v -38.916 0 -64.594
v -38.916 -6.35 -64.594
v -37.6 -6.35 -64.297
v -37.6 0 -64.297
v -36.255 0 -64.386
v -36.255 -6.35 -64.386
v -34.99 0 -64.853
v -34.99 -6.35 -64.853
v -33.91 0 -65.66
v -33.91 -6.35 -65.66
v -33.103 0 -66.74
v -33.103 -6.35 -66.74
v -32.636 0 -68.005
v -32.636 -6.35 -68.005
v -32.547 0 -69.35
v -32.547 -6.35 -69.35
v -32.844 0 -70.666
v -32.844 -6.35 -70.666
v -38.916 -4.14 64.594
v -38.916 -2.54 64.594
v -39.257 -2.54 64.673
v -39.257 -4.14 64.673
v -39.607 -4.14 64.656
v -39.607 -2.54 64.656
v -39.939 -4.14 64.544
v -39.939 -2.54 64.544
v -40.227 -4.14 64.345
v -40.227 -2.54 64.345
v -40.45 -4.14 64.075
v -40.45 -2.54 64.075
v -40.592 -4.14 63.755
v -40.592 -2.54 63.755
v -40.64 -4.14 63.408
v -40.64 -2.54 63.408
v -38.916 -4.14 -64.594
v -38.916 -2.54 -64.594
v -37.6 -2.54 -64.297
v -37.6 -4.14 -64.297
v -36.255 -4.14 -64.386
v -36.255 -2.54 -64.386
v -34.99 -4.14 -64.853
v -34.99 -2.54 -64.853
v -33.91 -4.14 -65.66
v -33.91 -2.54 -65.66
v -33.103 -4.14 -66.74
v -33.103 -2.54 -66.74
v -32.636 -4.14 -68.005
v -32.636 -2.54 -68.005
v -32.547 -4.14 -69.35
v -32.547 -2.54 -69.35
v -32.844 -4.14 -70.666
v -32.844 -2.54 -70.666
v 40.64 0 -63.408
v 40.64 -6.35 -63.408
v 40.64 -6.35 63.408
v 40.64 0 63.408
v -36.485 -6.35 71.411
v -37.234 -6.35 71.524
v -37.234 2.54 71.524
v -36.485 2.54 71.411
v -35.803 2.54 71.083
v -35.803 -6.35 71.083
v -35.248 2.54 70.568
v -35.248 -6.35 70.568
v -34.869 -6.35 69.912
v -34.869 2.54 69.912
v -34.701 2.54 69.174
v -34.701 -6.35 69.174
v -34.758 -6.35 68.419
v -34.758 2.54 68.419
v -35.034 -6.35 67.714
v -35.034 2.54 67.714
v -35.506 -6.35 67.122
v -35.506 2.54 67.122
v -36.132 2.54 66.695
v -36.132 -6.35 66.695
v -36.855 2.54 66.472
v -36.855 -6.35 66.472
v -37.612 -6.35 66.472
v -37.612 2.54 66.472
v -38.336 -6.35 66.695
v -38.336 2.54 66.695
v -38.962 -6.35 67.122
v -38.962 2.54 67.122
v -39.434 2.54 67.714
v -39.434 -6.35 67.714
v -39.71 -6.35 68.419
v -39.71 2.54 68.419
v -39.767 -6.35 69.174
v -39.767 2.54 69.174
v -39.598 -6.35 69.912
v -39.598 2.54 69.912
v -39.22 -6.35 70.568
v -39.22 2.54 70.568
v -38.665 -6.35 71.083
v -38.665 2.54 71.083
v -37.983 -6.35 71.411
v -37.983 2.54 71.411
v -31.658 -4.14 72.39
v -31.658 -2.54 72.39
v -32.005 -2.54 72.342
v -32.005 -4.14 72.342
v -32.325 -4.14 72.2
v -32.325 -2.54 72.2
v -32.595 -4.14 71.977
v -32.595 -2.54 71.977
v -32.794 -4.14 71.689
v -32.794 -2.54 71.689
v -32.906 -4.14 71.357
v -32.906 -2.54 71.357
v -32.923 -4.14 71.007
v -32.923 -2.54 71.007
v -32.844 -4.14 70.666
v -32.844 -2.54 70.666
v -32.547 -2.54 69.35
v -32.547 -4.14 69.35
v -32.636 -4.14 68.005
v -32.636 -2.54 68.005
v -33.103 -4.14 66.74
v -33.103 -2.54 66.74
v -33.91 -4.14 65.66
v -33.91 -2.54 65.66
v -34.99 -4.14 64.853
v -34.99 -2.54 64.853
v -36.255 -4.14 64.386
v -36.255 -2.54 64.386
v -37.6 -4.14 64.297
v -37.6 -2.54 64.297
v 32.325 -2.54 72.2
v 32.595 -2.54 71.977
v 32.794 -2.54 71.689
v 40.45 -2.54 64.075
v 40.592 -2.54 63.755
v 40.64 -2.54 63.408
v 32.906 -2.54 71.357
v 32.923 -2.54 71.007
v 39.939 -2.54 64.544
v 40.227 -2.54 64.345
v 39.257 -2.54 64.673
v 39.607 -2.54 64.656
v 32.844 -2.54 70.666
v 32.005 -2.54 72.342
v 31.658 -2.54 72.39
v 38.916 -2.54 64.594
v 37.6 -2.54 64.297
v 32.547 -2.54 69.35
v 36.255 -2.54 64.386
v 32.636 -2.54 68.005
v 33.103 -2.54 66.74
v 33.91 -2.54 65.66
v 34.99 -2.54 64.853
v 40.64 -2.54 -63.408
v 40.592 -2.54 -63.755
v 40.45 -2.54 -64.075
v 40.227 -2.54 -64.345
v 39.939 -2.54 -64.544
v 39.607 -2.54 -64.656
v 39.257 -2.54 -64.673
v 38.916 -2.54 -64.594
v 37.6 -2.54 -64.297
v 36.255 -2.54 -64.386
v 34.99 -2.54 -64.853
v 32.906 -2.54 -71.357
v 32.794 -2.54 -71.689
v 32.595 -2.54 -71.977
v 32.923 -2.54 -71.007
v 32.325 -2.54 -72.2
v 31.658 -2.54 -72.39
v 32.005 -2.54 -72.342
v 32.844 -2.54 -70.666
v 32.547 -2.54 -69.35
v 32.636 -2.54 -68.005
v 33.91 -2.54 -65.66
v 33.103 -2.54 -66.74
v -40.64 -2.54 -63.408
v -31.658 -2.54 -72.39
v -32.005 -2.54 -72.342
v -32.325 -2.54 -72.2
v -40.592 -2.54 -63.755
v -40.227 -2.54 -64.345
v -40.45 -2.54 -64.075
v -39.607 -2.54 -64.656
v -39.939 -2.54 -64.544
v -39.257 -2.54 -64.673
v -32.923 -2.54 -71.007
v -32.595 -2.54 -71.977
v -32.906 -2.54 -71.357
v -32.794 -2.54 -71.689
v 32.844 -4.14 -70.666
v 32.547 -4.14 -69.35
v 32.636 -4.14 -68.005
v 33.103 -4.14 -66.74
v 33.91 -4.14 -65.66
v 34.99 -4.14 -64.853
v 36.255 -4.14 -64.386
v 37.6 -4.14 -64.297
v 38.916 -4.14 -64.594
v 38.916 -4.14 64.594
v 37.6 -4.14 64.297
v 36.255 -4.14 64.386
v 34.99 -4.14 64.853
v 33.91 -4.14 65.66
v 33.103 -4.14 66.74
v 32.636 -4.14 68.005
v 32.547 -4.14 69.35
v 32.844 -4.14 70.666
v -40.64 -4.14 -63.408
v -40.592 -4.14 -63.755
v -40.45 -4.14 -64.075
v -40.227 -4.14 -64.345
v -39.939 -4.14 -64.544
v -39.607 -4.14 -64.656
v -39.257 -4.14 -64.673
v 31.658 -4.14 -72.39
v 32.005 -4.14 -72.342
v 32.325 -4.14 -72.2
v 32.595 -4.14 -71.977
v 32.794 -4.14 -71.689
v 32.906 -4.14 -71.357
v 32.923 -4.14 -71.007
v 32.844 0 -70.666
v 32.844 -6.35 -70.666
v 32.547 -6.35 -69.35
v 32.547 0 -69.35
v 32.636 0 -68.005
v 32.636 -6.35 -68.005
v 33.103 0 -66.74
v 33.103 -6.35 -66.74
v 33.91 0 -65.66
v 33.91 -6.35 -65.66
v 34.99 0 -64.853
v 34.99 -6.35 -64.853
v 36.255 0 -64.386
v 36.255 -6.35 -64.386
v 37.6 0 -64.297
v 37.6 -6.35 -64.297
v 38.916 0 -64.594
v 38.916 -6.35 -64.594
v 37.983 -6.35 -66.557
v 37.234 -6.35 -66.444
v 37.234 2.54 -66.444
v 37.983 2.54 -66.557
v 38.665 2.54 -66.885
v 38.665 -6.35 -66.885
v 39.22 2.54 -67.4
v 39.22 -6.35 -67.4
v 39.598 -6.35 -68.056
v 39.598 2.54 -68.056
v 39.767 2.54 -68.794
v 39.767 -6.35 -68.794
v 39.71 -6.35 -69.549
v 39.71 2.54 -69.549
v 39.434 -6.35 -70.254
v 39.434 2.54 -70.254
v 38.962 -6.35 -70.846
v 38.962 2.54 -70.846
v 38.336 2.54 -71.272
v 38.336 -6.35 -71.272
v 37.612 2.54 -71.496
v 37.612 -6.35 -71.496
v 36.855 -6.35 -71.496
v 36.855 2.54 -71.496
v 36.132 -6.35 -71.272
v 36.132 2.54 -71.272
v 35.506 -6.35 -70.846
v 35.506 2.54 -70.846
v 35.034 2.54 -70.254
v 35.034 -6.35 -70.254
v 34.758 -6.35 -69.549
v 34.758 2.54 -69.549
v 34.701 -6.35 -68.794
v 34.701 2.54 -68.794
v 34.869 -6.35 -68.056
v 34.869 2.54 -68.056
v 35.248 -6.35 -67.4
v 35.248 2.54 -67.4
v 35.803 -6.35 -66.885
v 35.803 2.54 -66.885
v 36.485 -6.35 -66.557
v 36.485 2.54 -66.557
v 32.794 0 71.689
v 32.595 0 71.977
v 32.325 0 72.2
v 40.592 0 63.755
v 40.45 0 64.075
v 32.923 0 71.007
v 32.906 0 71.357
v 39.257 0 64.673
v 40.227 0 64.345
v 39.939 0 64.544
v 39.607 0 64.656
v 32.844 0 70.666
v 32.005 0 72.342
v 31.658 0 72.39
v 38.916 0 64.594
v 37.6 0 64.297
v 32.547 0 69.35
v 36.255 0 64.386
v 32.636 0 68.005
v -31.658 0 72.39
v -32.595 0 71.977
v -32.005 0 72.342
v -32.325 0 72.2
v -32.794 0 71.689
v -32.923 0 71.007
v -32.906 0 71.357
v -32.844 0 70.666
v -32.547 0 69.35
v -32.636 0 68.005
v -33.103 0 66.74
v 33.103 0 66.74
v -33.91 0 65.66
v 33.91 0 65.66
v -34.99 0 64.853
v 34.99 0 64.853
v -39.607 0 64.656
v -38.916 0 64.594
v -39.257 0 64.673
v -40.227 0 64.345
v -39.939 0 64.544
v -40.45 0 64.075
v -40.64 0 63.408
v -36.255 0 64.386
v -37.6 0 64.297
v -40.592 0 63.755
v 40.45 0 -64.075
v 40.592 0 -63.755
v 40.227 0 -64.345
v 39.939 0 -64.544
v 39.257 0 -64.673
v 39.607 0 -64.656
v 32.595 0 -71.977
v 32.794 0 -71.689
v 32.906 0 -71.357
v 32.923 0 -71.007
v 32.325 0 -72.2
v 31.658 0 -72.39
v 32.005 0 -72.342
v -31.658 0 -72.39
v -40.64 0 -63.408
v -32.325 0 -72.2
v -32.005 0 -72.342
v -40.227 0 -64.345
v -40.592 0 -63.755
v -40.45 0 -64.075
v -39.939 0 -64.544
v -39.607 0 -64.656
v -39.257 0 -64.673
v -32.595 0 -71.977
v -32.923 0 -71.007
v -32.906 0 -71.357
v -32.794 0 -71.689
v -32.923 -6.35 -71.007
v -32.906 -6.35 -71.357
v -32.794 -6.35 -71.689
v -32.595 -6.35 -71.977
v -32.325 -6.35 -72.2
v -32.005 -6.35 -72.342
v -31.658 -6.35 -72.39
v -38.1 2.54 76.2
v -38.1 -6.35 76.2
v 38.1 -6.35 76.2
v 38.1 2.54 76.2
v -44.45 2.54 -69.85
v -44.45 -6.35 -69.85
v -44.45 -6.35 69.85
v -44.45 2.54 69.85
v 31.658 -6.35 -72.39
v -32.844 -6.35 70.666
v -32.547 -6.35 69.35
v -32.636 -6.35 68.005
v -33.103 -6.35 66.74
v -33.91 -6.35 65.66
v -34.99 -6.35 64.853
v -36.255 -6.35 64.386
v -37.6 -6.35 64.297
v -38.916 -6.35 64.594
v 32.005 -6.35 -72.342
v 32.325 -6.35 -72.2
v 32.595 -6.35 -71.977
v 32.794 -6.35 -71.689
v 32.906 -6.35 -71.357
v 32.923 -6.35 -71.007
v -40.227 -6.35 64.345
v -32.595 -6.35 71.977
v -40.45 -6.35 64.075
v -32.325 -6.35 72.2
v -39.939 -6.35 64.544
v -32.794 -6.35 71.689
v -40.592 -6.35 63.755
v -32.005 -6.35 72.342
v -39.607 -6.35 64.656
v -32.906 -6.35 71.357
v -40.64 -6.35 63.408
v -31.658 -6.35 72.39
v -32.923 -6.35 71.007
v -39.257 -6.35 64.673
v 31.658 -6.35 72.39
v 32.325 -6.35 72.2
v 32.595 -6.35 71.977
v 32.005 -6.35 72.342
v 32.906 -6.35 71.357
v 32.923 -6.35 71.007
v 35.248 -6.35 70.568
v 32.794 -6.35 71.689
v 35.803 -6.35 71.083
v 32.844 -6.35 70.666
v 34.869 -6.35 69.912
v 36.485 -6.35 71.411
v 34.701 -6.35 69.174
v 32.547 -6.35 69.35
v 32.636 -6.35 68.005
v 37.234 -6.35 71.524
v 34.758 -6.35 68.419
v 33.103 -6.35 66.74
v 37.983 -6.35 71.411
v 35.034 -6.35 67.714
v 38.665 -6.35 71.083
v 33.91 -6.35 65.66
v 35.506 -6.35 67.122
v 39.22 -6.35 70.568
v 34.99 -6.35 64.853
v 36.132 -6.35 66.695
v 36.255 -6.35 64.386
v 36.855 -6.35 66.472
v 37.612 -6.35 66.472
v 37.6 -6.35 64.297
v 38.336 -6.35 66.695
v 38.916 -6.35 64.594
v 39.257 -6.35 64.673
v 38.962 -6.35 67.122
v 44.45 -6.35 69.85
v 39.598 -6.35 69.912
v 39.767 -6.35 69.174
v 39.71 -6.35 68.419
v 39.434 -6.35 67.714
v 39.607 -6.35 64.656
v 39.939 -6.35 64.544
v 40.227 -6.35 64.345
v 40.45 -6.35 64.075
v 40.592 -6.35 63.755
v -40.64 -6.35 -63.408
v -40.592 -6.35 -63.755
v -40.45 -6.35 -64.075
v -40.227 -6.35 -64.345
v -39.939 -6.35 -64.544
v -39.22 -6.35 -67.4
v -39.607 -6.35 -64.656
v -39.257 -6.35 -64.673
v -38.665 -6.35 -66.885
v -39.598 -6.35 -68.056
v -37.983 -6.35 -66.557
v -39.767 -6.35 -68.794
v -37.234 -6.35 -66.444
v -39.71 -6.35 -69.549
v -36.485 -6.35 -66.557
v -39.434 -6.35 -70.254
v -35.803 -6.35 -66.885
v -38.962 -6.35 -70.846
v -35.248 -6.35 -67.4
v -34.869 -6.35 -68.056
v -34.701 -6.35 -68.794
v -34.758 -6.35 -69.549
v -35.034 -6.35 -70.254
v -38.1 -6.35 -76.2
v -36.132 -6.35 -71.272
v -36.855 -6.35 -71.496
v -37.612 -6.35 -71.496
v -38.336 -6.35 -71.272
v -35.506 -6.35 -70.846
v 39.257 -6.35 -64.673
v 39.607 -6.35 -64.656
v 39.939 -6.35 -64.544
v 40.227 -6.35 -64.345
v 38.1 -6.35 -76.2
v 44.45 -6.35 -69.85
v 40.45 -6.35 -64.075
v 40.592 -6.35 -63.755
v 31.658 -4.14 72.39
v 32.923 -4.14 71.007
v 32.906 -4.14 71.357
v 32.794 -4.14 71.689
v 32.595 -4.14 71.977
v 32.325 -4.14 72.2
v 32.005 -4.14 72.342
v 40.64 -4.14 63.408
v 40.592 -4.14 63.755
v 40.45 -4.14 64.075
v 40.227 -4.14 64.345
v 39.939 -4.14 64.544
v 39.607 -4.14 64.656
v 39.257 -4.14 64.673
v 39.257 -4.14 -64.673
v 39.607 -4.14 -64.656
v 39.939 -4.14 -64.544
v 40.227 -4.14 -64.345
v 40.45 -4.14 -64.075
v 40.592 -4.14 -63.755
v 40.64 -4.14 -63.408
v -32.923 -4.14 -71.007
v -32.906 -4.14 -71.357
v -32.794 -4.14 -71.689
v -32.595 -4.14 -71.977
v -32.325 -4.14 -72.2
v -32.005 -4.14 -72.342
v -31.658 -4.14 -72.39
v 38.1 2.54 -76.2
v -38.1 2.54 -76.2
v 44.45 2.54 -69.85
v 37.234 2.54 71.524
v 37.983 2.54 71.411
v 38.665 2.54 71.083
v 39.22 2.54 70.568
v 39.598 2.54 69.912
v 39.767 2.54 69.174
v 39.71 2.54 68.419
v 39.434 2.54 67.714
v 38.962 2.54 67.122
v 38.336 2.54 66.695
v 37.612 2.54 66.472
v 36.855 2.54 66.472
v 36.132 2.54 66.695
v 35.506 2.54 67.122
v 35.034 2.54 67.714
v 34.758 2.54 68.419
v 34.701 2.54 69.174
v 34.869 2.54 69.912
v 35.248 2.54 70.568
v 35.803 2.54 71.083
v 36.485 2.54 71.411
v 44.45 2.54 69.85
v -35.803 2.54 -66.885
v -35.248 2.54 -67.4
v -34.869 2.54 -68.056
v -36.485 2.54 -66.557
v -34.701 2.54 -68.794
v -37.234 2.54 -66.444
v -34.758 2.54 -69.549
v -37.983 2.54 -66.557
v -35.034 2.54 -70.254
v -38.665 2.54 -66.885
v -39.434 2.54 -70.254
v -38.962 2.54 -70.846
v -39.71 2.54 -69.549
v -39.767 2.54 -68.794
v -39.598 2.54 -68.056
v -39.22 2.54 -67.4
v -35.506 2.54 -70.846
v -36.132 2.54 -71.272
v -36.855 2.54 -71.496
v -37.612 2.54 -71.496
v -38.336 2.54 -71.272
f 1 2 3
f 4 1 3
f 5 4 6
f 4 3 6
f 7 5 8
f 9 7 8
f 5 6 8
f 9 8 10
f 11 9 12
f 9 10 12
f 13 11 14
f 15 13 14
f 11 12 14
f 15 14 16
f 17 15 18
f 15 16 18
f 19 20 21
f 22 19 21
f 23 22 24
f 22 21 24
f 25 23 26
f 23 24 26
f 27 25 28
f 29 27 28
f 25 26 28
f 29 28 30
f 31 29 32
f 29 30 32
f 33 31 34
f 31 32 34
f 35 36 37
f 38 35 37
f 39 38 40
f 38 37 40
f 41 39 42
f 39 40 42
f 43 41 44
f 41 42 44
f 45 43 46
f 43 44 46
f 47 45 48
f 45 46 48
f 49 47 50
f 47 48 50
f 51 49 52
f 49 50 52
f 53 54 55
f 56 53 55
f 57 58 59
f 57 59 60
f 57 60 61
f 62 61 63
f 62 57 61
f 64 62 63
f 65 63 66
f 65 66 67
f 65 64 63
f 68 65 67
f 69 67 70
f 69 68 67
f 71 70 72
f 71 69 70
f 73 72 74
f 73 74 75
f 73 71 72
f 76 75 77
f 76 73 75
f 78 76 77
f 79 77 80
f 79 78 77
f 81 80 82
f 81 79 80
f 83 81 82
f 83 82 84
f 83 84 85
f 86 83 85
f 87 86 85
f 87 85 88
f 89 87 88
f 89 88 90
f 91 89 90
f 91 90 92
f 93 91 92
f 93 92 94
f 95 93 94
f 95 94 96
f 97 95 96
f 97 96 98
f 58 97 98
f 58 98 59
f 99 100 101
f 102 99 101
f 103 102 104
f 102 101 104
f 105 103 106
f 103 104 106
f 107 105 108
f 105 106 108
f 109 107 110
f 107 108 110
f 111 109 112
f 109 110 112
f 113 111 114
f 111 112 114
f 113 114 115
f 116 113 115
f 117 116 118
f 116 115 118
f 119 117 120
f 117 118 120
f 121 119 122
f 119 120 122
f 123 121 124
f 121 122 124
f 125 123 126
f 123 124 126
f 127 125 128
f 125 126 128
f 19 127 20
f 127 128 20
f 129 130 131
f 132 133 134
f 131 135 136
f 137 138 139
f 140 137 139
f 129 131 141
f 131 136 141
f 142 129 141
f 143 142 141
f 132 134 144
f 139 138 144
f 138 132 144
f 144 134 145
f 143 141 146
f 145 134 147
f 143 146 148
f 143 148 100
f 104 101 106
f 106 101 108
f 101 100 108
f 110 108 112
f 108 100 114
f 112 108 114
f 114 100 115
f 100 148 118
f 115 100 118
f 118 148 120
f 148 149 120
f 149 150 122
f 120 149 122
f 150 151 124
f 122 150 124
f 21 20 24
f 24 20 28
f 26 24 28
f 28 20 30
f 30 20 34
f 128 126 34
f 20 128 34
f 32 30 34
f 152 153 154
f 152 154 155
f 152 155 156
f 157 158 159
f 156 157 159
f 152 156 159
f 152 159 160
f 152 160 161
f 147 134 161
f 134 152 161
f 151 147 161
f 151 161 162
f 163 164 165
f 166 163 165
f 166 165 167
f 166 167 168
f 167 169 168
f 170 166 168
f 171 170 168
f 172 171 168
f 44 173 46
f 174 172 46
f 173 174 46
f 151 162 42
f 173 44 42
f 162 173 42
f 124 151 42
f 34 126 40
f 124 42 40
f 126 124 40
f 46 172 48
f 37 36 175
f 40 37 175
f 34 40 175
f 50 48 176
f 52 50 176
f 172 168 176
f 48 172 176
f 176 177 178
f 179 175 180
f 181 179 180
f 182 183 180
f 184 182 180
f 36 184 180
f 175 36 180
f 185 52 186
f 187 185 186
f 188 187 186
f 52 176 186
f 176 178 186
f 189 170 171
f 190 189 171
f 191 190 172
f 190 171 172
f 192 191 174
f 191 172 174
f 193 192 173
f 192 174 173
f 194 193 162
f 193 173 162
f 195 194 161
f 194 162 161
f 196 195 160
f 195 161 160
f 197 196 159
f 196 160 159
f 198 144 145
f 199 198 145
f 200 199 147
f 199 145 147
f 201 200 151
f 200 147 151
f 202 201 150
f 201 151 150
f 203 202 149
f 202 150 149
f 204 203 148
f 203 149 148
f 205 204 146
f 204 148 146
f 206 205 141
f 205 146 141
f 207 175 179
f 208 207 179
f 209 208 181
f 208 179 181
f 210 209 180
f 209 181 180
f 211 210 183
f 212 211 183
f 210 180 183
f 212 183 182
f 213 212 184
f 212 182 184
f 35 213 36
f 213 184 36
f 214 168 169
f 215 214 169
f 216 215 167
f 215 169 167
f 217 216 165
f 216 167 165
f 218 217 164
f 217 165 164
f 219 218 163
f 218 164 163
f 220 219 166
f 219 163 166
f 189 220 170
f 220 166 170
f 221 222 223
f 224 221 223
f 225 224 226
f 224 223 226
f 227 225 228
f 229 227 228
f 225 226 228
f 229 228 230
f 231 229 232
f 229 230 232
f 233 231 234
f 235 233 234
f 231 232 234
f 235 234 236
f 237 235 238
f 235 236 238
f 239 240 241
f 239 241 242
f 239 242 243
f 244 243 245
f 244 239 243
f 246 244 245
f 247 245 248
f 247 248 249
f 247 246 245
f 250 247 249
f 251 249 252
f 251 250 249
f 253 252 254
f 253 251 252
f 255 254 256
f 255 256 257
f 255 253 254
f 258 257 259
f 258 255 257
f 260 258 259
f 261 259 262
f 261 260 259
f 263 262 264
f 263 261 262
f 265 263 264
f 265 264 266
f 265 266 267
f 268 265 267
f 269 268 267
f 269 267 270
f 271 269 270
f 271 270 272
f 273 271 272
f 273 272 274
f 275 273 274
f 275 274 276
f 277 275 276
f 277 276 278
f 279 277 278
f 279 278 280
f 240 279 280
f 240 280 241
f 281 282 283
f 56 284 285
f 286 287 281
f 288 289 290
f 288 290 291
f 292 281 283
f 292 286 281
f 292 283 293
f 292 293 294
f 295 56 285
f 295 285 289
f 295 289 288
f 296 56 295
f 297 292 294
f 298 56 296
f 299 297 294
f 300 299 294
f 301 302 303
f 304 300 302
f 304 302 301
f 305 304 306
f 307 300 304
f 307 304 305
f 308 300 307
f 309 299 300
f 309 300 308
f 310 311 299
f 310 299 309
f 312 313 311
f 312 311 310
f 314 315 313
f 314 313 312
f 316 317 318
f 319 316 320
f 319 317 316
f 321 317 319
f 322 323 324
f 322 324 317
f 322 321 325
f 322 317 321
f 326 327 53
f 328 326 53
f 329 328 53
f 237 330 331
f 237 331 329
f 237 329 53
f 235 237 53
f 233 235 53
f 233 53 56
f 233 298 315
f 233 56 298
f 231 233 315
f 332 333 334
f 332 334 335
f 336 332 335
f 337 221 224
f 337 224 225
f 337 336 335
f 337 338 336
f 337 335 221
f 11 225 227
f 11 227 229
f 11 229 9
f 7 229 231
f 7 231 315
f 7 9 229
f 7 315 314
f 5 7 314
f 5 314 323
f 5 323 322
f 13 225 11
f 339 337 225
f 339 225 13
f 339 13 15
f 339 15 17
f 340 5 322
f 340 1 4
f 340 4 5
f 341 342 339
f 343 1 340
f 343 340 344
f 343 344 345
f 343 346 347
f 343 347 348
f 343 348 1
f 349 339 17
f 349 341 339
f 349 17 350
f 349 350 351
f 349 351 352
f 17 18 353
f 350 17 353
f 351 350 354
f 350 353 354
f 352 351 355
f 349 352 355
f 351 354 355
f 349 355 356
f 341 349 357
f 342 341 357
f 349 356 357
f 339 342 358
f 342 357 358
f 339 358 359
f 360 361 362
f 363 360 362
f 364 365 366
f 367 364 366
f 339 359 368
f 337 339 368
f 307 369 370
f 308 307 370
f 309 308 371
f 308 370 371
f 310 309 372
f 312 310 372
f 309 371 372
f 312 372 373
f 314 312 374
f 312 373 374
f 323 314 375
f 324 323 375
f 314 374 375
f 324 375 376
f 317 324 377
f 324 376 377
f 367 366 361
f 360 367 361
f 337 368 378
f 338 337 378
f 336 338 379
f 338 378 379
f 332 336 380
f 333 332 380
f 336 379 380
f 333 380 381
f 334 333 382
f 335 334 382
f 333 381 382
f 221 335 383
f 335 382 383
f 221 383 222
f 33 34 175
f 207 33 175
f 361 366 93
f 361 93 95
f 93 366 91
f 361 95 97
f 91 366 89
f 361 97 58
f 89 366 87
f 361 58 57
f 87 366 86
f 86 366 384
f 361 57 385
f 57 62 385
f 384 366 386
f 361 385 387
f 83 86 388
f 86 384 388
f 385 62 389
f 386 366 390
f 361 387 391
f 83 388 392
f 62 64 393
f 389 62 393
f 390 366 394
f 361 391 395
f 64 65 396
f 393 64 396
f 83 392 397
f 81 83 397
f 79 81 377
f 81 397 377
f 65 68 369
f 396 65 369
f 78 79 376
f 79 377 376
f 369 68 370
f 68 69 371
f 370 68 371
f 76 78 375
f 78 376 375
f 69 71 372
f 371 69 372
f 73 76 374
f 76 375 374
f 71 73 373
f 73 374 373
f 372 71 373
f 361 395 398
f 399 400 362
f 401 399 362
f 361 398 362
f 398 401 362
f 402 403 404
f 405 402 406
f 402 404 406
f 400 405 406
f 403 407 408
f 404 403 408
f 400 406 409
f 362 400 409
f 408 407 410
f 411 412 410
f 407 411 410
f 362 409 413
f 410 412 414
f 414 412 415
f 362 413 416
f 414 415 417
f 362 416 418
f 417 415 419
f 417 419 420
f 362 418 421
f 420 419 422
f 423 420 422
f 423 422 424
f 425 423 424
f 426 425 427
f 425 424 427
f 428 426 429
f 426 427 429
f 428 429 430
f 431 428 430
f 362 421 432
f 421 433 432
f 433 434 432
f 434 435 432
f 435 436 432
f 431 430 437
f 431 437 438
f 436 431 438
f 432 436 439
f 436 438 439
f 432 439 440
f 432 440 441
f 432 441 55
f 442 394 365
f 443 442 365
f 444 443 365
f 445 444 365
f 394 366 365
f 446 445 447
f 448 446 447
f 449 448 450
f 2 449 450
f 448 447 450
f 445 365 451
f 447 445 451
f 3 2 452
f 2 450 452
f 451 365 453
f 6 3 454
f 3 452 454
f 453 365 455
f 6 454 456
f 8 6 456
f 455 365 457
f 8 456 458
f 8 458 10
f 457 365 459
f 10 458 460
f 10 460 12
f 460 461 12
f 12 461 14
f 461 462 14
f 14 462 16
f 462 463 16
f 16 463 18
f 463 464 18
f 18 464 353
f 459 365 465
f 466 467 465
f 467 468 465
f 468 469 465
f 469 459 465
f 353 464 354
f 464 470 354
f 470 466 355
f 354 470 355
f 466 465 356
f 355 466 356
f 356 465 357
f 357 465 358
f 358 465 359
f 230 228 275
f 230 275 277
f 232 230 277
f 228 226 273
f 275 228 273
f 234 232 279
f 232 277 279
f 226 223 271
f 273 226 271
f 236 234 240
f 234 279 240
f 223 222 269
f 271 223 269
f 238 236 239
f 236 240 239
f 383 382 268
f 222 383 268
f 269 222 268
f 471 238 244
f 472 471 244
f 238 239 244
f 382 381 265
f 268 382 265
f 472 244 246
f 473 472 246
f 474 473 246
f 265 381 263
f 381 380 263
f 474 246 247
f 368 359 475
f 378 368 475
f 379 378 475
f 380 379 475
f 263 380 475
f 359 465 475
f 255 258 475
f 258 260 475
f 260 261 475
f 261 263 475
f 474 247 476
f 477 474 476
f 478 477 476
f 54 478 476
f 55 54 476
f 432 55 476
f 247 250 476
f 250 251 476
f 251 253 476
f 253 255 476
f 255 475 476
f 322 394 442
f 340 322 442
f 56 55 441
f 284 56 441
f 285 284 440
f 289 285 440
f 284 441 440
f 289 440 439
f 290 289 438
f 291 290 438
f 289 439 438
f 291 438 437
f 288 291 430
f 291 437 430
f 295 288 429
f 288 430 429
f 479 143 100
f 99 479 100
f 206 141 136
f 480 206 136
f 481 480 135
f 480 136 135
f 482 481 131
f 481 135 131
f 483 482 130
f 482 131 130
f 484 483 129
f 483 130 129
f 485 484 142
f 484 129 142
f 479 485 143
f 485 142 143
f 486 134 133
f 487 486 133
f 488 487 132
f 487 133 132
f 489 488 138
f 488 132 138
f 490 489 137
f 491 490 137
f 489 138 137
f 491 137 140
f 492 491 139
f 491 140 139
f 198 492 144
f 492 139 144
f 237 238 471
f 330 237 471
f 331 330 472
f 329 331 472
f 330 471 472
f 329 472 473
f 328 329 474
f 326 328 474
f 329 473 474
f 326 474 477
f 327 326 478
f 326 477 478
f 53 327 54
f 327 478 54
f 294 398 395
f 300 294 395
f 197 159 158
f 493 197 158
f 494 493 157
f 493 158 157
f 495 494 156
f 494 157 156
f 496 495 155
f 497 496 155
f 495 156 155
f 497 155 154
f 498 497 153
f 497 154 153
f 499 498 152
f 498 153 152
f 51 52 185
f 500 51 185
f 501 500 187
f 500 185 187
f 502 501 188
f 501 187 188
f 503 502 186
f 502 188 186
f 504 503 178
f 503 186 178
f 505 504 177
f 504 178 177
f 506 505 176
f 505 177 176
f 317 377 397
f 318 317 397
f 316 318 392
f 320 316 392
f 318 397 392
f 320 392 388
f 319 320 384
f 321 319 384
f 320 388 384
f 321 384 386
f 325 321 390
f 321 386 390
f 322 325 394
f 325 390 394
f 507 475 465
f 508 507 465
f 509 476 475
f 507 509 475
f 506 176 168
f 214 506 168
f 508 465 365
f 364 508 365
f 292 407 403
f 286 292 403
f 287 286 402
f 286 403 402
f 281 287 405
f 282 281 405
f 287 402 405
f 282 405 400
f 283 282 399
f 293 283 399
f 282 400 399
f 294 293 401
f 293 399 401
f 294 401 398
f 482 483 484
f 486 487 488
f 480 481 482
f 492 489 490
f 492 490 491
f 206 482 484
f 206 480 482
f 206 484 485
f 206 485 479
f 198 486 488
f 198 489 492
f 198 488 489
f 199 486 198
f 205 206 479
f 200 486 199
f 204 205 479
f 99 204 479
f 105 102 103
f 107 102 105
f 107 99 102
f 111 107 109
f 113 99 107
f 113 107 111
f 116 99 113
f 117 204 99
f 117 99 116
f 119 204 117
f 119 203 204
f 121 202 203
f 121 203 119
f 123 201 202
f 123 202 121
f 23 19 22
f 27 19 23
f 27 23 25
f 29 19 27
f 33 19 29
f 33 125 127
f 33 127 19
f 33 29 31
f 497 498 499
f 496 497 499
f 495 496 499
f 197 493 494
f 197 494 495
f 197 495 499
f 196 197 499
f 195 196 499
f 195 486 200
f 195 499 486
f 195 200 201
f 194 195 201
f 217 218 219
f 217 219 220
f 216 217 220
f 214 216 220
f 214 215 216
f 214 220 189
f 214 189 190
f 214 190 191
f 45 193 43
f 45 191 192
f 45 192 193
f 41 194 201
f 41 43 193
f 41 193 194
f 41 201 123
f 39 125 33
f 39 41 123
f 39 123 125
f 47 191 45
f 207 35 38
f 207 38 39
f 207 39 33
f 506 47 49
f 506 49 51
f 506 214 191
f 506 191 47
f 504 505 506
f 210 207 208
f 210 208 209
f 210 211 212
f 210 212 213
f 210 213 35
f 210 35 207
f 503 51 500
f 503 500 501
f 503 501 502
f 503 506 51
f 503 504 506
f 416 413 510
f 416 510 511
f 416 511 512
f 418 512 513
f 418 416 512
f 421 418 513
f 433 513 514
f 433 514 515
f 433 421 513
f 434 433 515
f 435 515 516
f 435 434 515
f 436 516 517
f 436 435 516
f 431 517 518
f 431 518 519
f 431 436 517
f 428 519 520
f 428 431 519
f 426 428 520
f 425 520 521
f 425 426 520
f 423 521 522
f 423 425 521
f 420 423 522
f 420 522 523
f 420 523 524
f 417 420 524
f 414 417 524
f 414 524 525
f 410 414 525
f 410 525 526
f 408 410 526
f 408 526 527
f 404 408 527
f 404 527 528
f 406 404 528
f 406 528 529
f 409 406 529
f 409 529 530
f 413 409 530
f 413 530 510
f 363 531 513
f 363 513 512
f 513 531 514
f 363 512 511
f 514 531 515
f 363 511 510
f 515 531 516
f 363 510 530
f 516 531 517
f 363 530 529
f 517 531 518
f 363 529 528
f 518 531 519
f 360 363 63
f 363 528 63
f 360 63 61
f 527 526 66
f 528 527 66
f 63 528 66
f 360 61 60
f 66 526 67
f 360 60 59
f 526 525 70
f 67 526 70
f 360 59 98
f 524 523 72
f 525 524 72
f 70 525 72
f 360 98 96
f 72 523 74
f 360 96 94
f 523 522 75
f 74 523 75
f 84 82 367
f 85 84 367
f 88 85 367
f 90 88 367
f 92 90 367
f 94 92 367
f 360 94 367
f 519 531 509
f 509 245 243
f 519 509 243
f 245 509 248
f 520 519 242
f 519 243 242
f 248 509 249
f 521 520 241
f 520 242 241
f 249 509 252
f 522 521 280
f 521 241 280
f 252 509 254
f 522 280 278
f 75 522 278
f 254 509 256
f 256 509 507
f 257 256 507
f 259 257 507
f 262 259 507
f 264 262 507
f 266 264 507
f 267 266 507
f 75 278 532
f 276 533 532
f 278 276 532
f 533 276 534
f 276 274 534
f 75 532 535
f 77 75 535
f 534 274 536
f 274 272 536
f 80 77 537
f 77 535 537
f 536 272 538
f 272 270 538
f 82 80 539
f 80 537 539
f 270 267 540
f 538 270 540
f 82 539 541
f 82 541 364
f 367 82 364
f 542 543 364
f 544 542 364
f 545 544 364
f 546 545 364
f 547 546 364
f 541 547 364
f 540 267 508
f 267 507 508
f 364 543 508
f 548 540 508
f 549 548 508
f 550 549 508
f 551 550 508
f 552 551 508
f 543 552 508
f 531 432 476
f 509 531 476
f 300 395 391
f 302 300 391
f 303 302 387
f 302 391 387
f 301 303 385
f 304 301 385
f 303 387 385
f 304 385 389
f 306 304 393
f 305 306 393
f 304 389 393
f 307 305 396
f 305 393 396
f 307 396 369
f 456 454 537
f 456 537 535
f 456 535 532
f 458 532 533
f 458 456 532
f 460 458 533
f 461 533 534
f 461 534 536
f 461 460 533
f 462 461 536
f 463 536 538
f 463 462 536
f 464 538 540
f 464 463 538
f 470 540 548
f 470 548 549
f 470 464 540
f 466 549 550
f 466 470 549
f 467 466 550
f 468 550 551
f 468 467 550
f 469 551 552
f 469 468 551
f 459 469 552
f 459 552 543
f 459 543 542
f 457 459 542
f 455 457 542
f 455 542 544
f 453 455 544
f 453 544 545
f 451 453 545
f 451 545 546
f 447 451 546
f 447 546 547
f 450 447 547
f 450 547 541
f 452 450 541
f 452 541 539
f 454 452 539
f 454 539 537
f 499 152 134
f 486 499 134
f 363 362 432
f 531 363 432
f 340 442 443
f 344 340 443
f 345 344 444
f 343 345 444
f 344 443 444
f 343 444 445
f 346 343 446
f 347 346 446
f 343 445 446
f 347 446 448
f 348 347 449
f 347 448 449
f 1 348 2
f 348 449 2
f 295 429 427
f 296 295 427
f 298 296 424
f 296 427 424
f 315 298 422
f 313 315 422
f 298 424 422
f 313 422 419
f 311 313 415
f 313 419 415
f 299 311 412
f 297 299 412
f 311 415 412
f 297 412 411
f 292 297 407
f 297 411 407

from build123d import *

# Parameters (mm, degrees)
SKETCH2_R           = 2.54
BOSS_EXTRUDE1_DEPTH = 2.54
BOSS_EXTRUDE2_START = -6.35
SKETCH2_3_R         = 2.54
BOSS_EXTRUDE2_DEPTH = 6.35
BOSS_EXTRUDE3_START = -2.54
BOSS_EXTRUDE3_DEPTH = 1.6


with BuildPart() as part:
    # Sketch2 → Boss-Extrude1 (new body)
    with BuildSketch(Plane(origin=(0, 0, 0), x_dir=(1, 0, 0), z_dir=(0, 1, 0))):
        Polygon((-44.45, 69.85), (-38.1, 76.2), (38.1, 76.2), (44.45, 69.85), (44.45, -69.85), (38.1, -76.2), (-38.1, -76.2), (-44.45, -69.85), align=None)
        with Locations(Location((-37.233884746, 68.983884746, 0), (0, 0, 270))):
            Circle(SKETCH2_R, mode=Mode.SUBTRACT)
        with Locations(Location((37.233884746, 68.983884746, 0), (0, 0, 270))):
            Circle(SKETCH2_R, mode=Mode.SUBTRACT)
        with Locations(Location((37.233884746, -68.983884746, 0), (0, 0, 270))):
            Circle(SKETCH2_R, mode=Mode.SUBTRACT)
        with Locations(Location((-37.233884746, -68.983884746, 0), (0, 0, 270))):
            Circle(SKETCH2_R, mode=Mode.SUBTRACT)
    extrude(amount=BOSS_EXTRUDE1_DEPTH)

    # Sketch2<3> → Boss-Extrude2 (add)
    with BuildSketch(Plane(origin=(0, 0, 0), x_dir=(1, 0, 0), z_dir=(0, 1, 0)).offset(BOSS_EXTRUDE2_START)):
        Polygon((-38.1, 76.2), (-44.45, 69.85), (-44.45, -69.85), (-38.1, -76.2), (38.1, -76.2), (44.45, -69.85), (44.45, 69.85), (38.1, 76.2), align=None)
        with BuildLine():
            Line((40.64, 63.408074469), (40.64, -63.408074469))
            ThreePointArc((40.64, -63.408074469), (40.089682627, -64.454476359), (38.9156584, -64.594022912))
            ThreePointArc((38.9156584, -64.594022912), (33.909787158, -65.659787158), (32.844022912, -70.6656584))
            ThreePointArc((32.844022912, -70.6656584), (32.704476359, -71.839682627), (31.658074469, -72.39))
            Line((31.658074469, -72.39), (-31.658074469, -72.39))
            ThreePointArc((-31.658074469, -72.39), (-32.704476359, -71.839682627), (-32.844022912, -70.6656584))
            ThreePointArc((-32.844022912, -70.6656584), (-33.909787158, -65.659787158), (-38.9156584, -64.594022912))
            ThreePointArc((-38.9156584, -64.594022912), (-40.089682627, -64.454476359), (-40.64, -63.408074469))
            Line((-40.64, -63.408074469), (-40.64, 63.408074469))
            ThreePointArc((-40.64, 63.408074469), (-40.089682627, 64.454476359), (-38.9156584, 64.594022912))
            ThreePointArc((-38.9156584, 64.594022912), (-33.909787158, 65.659787158), (-32.844022912, 70.6656584))
            ThreePointArc((-32.844022912, 70.6656584), (-32.704476359, 71.839682627), (-31.658074469, 72.39))
            Line((-31.658074469, 72.39), (31.658074469, 72.39))
            ThreePointArc((31.658074469, 72.39), (32.704476359, 71.839682627), (32.844022912, 70.6656584))
            ThreePointArc((32.844022912, 70.6656584), (33.909787158, 65.659787158), (38.9156584, 64.594022912))
            ThreePointArc((38.9156584, 64.594022912), (40.089682627, 64.454476359), (40.64, 63.408074469))
        make_face(mode=Mode.SUBTRACT)
        with Locations(Location((-37.233884746, 68.983884746, 0), (0, 0, 270))):
            Circle(SKETCH2_3_R, mode=Mode.SUBTRACT)
        with Locations(Location((37.233884746, 68.983884746, 0), (0, 0, 270))):
            Circle(SKETCH2_3_R, mode=Mode.SUBTRACT)
        with Locations(Location((-37.233884746, -68.983884746, 0), (0, 0, 270))):
            Circle(SKETCH2_3_R, mode=Mode.SUBTRACT)
        with Locations(Location((37.233884746, -68.983884746, 0), (0, 0, 270))):
            Circle(SKETCH2_3_R, mode=Mode.SUBTRACT)
    extrude(amount=BOSS_EXTRUDE2_DEPTH)


with BuildPart() as body_2:
    # Sketch2<4> → Boss-Extrude3 (new body)
    with BuildSketch(Plane(origin=(0, 0, 0), x_dir=(1, 0, 0), z_dir=(0, 1, 0)).offset(BOSS_EXTRUDE3_START)):
        with BuildLine():
            ThreePointArc((-40.64, 63.408074469), (-40.089682627, 64.454476359), (-38.9156584, 64.594022912))
            ThreePointArc((-38.9156584, 64.594022912), (-33.909787158, 65.659787158), (-32.844022912, 70.6656584))
            ThreePointArc((-32.844022912, 70.6656584), (-32.704476359, 71.839682627), (-31.658074469, 72.39))
            Line((-31.658074469, 72.39), (31.658074469, 72.39))
            ThreePointArc((31.658074469, 72.39), (32.704476359, 71.839682627), (32.844022912, 70.6656584))
            ThreePointArc((32.844022912, 70.6656584), (33.909787158, 65.659787158), (38.9156584, 64.594022912))
            ThreePointArc((38.9156584, 64.594022912), (40.089682627, 64.454476359), (40.64, 63.408074469))
            Line((40.64, 63.408074469), (40.64, -63.408074469))
            ThreePointArc((40.64, -63.408074469), (40.089682627, -64.454476359), (38.9156584, -64.594022912))
            ThreePointArc((38.9156584, -64.594022912), (33.909787158, -65.659787158), (32.844022912, -70.6656584))
            ThreePointArc((32.844022912, -70.6656584), (32.704476359, -71.839682627), (31.658074469, -72.39))
            Line((31.658074469, -72.39), (-31.658074469, -72.39))
            ThreePointArc((-31.658074469, -72.39), (-32.704476359, -71.839682627), (-32.844022912, -70.6656584))
            ThreePointArc((-32.844022912, -70.6656584), (-33.909787158, -65.659787158), (-38.9156584, -64.594022912))
            ThreePointArc((-38.9156584, -64.594022912), (-40.089682627, -64.454476359), (-40.64, -63.408074469))
            Line((-40.64, -63.408074469), (-40.64, 63.408074469))
        make_face()
    extrude(amount=-BOSS_EXTRUDE3_DEPTH)


solid = Compound([part.part, body_2.part])
